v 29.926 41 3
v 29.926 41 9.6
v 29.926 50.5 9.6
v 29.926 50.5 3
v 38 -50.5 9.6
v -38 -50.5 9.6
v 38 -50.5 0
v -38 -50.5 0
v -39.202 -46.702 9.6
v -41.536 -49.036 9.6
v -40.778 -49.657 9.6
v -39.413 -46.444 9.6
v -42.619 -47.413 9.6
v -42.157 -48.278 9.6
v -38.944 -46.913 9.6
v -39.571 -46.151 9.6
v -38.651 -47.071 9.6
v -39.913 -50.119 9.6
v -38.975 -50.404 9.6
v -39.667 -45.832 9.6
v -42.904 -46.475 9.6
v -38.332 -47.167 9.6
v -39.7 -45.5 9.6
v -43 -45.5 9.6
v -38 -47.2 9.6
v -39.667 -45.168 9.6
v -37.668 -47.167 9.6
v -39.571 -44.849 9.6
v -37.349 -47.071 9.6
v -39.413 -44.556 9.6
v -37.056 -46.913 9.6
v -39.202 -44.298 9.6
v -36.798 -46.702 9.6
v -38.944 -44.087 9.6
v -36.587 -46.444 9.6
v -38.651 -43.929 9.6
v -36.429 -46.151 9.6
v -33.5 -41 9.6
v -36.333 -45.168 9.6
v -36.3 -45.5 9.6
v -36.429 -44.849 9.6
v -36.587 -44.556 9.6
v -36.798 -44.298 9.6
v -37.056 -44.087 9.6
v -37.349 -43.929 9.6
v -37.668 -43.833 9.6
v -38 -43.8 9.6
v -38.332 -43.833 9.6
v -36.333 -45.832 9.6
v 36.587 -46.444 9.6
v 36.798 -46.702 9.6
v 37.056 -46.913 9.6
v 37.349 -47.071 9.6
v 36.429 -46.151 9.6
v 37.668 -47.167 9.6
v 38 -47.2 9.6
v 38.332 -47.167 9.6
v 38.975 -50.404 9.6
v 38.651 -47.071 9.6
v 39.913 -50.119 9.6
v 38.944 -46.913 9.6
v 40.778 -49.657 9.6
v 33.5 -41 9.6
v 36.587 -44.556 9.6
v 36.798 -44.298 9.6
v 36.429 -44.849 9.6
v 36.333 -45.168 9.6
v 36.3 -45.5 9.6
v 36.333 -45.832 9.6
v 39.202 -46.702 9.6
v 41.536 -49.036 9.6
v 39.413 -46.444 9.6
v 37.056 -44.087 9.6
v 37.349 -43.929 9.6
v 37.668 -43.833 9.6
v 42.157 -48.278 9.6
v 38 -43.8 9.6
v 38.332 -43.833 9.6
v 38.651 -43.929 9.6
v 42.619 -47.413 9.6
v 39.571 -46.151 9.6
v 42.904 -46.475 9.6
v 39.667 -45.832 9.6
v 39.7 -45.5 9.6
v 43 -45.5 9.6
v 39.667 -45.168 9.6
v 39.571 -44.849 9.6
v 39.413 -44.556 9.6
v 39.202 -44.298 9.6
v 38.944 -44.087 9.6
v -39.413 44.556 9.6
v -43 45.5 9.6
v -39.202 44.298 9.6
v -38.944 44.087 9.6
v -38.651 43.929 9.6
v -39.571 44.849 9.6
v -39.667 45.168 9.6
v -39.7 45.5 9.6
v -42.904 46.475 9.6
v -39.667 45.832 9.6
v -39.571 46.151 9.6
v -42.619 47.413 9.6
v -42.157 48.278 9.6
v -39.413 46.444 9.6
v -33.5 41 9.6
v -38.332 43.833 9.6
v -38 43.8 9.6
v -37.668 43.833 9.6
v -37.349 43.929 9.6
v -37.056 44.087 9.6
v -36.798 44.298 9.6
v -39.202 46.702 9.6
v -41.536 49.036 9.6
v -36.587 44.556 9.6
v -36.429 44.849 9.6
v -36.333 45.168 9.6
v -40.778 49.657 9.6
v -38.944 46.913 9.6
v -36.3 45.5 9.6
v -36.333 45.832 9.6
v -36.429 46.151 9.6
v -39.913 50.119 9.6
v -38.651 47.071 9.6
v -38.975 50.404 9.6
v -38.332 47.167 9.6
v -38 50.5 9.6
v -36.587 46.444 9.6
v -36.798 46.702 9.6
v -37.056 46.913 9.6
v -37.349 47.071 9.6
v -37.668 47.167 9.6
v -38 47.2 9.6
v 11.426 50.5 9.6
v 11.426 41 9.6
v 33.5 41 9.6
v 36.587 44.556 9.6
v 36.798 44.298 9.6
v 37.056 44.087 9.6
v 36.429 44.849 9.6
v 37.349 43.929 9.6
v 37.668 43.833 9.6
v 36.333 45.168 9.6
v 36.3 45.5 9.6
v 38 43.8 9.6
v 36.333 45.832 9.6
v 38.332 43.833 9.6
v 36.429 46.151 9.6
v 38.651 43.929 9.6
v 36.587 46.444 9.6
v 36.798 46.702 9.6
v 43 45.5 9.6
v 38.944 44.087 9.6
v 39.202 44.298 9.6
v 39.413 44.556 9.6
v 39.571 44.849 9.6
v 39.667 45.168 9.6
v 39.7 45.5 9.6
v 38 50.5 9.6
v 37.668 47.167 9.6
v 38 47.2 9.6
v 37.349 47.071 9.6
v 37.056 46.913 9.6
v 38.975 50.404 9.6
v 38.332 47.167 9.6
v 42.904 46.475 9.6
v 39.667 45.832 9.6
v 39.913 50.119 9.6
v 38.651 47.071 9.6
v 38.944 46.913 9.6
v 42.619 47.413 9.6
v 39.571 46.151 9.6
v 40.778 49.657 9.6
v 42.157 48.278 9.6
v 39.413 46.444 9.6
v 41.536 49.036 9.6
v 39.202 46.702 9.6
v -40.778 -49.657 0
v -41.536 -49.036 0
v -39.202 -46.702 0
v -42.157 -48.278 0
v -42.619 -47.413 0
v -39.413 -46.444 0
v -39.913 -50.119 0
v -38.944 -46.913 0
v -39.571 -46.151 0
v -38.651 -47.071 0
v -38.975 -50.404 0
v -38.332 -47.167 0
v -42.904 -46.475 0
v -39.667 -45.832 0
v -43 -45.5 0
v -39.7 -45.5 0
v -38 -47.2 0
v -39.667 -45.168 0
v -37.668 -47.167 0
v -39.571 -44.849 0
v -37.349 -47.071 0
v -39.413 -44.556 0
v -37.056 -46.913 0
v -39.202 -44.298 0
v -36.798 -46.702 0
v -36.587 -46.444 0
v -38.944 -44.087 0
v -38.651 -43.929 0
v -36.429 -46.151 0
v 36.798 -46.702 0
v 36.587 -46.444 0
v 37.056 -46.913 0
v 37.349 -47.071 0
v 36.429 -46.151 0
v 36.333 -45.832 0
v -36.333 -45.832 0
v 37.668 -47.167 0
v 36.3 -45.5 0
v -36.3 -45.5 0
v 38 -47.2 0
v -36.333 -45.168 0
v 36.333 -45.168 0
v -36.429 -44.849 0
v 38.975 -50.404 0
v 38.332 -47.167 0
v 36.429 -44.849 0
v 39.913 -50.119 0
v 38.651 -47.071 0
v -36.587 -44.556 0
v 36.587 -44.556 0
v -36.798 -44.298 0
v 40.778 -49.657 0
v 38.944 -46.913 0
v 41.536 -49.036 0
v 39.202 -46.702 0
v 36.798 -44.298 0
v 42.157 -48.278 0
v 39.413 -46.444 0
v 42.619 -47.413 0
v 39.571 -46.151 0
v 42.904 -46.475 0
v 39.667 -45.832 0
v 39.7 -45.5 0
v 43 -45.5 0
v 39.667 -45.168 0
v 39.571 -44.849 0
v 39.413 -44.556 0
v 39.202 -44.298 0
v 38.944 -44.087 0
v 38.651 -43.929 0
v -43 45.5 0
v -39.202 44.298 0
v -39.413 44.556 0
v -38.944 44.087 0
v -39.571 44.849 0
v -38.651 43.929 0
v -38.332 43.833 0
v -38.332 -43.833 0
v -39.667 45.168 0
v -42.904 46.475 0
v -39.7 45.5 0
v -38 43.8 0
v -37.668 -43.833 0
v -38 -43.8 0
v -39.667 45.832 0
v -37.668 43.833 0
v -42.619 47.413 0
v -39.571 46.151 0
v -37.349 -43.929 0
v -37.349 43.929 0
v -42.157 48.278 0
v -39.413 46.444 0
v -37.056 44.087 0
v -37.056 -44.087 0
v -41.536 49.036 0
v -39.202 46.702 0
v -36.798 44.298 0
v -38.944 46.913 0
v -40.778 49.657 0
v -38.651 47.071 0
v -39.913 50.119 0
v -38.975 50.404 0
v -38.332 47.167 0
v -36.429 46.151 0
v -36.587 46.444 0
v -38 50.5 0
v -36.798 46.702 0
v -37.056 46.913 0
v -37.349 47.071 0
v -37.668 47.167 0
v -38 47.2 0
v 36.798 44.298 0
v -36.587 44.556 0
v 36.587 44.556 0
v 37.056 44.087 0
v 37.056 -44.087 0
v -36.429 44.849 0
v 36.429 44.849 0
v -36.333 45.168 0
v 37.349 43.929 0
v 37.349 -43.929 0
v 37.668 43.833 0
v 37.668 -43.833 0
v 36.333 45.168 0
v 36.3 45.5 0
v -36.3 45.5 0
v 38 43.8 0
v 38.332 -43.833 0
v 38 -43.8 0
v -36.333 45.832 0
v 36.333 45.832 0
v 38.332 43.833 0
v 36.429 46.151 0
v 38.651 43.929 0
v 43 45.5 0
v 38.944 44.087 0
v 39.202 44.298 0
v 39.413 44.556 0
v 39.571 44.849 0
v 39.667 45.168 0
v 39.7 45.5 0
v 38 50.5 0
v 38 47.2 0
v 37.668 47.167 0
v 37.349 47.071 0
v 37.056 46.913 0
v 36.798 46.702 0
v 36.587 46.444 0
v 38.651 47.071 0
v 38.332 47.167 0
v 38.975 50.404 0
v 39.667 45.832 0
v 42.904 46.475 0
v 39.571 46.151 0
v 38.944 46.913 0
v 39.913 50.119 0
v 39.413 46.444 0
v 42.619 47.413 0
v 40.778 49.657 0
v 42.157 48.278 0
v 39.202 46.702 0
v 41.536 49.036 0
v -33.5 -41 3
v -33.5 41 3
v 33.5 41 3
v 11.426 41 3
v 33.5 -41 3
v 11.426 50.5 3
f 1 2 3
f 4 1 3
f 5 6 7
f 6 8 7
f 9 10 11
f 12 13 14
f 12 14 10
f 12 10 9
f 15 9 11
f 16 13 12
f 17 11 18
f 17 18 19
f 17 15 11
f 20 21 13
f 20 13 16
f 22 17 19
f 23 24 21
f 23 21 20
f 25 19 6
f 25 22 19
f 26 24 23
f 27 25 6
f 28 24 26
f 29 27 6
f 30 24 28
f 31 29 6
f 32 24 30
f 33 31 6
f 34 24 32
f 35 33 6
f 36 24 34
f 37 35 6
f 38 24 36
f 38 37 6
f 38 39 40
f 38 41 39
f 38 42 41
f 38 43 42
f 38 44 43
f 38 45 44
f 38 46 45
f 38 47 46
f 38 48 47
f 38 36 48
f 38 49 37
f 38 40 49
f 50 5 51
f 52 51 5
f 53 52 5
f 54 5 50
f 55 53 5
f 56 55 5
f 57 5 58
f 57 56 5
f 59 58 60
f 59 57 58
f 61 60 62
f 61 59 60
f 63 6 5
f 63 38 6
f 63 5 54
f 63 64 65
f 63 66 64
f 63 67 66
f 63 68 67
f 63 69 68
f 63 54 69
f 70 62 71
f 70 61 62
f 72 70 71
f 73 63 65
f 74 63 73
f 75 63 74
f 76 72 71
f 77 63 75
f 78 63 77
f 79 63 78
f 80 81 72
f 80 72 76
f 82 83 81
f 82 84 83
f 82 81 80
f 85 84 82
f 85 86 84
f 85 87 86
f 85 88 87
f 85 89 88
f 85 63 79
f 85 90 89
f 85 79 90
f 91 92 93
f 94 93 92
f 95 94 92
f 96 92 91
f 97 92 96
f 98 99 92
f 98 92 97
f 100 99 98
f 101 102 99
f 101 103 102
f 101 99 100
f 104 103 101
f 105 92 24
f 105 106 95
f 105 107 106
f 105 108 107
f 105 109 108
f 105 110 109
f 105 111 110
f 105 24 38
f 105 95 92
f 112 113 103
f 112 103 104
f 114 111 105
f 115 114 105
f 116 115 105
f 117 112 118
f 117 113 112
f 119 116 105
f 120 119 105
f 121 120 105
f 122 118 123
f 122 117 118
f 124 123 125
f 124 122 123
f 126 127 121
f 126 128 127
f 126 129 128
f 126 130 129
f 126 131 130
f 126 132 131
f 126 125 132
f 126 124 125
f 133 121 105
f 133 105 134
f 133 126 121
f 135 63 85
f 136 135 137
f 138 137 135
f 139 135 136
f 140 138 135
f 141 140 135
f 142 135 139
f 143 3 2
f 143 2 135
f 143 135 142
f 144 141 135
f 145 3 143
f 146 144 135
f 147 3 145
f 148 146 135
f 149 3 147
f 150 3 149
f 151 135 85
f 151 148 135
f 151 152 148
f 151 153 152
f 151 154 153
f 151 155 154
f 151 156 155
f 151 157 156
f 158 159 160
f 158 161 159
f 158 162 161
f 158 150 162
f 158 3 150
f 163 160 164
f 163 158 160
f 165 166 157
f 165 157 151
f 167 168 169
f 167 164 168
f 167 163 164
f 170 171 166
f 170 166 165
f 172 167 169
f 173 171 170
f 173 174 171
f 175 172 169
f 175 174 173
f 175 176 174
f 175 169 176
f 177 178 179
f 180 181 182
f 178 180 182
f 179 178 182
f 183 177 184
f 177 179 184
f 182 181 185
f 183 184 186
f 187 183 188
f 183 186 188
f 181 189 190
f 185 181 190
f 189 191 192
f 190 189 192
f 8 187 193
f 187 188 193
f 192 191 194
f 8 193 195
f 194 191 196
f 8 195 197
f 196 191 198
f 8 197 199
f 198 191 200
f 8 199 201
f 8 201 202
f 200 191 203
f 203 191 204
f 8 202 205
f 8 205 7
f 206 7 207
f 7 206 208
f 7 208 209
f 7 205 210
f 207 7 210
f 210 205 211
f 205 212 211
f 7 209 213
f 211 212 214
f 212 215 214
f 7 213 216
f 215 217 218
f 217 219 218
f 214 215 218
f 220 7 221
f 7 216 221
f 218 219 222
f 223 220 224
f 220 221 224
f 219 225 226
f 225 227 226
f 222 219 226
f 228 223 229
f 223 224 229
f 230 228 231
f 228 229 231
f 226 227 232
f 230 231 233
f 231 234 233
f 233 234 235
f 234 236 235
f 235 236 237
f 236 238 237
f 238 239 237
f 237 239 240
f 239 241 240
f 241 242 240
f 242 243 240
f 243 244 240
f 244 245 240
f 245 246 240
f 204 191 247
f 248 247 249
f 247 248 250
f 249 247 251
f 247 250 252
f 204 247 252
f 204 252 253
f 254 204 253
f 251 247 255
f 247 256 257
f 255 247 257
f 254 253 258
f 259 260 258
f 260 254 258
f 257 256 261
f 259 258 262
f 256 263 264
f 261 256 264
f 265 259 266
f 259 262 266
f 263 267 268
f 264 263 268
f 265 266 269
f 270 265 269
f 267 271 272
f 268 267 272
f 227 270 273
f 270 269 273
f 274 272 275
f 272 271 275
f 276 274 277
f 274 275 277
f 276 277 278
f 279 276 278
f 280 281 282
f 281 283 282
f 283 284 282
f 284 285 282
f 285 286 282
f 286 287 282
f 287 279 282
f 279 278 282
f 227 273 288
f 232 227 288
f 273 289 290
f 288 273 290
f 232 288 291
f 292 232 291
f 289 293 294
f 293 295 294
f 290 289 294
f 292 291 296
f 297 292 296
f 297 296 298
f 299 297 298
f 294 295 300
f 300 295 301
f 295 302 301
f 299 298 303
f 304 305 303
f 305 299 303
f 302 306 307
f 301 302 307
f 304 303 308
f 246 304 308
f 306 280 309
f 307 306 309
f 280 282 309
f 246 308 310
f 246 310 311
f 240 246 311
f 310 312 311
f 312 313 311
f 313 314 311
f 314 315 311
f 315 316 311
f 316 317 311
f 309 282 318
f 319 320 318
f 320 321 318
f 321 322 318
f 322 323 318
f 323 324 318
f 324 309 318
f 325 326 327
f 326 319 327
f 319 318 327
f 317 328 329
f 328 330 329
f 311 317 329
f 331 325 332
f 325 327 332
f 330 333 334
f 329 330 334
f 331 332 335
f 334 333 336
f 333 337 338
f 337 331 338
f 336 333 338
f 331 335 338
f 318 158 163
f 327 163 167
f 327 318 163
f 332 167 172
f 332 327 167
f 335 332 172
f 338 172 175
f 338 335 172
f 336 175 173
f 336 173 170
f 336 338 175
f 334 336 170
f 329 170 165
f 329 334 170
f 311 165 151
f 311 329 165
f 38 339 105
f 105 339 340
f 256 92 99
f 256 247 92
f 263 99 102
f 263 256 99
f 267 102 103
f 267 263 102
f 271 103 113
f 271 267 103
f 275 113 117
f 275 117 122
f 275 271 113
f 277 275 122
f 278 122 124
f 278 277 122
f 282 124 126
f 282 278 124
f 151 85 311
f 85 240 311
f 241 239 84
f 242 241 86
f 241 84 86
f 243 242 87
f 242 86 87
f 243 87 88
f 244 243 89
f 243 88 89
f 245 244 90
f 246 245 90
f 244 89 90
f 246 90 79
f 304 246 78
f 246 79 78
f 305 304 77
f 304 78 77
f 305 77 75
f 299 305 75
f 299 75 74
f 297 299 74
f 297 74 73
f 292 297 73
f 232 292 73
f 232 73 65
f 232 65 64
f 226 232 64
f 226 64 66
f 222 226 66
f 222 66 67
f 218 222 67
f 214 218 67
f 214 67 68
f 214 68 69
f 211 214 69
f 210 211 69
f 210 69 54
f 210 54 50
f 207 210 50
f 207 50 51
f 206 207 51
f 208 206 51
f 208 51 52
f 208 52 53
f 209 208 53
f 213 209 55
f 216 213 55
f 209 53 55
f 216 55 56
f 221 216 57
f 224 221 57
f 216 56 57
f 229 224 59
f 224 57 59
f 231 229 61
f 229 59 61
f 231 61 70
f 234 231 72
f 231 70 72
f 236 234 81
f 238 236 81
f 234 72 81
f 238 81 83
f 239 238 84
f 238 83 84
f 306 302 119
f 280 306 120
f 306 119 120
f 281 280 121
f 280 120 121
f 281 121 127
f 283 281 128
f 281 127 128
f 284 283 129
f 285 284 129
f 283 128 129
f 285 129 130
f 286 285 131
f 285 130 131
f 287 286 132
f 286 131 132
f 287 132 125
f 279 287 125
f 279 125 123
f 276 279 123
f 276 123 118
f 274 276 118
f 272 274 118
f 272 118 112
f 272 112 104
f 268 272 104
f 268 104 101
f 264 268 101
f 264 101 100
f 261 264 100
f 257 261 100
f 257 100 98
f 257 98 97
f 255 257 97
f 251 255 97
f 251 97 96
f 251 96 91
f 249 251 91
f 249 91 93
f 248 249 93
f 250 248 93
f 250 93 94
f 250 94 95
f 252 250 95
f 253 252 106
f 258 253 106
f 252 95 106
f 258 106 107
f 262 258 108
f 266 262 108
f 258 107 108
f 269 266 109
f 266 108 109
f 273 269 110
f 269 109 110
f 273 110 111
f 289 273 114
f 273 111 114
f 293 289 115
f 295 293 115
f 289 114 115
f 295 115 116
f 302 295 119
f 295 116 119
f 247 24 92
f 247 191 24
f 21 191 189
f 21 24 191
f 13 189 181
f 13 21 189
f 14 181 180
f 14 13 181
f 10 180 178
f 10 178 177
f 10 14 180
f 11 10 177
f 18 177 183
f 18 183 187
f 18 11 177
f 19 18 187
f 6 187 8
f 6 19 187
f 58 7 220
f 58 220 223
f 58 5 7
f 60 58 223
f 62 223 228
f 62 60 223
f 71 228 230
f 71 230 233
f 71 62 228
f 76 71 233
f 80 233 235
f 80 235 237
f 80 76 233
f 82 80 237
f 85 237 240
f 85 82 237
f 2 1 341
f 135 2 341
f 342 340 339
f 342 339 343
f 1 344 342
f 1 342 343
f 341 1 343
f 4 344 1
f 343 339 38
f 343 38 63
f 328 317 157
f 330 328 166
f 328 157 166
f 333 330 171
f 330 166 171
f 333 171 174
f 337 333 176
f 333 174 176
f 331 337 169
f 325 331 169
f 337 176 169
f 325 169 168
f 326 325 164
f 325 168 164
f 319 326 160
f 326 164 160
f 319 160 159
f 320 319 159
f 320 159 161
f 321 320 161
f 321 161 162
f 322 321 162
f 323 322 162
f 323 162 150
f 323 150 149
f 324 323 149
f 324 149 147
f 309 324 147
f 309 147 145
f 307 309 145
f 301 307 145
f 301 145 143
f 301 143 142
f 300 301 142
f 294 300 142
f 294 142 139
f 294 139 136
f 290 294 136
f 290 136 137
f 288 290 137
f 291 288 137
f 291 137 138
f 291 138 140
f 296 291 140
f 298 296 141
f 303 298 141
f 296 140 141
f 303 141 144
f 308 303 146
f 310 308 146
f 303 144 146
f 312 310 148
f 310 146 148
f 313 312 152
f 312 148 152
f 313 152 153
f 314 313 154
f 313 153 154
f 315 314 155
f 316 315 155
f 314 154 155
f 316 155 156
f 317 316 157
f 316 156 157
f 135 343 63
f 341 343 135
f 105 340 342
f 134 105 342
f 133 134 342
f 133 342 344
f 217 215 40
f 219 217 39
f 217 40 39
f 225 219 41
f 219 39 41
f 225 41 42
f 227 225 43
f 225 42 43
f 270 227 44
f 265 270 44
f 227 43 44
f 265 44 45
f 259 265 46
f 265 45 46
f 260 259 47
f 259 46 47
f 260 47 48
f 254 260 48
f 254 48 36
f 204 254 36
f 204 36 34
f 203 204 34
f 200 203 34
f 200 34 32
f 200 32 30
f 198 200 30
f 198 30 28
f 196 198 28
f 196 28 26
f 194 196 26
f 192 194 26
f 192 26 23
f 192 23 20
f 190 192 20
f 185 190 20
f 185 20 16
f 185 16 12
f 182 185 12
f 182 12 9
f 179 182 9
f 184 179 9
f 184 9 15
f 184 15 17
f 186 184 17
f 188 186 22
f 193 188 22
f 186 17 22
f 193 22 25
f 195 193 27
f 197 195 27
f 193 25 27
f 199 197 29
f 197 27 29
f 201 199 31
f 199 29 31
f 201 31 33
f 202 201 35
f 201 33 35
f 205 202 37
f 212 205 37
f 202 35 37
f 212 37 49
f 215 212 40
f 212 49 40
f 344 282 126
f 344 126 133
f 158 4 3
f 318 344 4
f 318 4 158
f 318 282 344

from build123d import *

# Parameters (mm, degrees)
SKETCH_W        = 86
SKETCH_H        = 101
PAD_DEPTH       = 3
SKETCH001_W     = 86
SKETCH001_H     = 101
SKETCH001_W_2   = 67
SKETCH001_H_2   = 82
PAD001_DEPTH    = 6.6
SKETCH002_R     = 1.7
POCKET_DEPTH    = 12
SKETCH003_W     = 18.5
SKETCH003_H     = 9.5
POCKET001_DEPTH = 6.6
FILLET_R        = 5


with BuildPart() as part:
    # Sketch → Pad (new body)
    with BuildSketch(Plane.XY):
        Rectangle(SKETCH_W, SKETCH_H)
    extrude(amount=PAD_DEPTH)

    # Sketch001 (on Face6 of Pad) → Pad001 (join)
    with BuildSketch(Plane.XY.offset(3)):
        Rectangle(SKETCH001_W, SKETCH001_H)
        Rectangle(SKETCH001_W_2, SKETCH001_H_2, mode=Mode.SUBTRACT)
    extrude(amount=PAD001_DEPTH)

    # Sketch002 (on Face3 of Pad001) → Pocket (cut)
    with BuildSketch(Plane.XY.offset(9.6)):
        with Locations((-38, -45.5)):
            Circle(SKETCH002_R)
        with Locations((-38, 45.5)):
            Circle(SKETCH002_R)
        with Locations((38, 45.5)):
            Circle(SKETCH002_R)
        with Locations((38, -45.5)):
            Circle(SKETCH002_R)
    extrude(amount=-POCKET_DEPTH, mode=Mode.SUBTRACT)

    # Sketch003 (on Face10 of Pocket) → Pocket001 (cut)
    with BuildSketch(Plane.XY.offset(9.6)):
        with Locations((20.676, 45.75)):
            Rectangle(SKETCH003_W, SKETCH003_H)
    extrude(amount=-POCKET001_DEPTH, mode=Mode.SUBTRACT)

    # Fillet
    fillet_edges = [part.edges().sort_by_distance(p)[0] for p in [
        (43, -50.5, 4.8),
        (-43, -50.5, 4.8),
        (-43, 50.5, 4.8),
        (43, 50.5, 4.8),
    ]]
    fillet(fillet_edges, radius=FILLET_R)


solid = part.part
